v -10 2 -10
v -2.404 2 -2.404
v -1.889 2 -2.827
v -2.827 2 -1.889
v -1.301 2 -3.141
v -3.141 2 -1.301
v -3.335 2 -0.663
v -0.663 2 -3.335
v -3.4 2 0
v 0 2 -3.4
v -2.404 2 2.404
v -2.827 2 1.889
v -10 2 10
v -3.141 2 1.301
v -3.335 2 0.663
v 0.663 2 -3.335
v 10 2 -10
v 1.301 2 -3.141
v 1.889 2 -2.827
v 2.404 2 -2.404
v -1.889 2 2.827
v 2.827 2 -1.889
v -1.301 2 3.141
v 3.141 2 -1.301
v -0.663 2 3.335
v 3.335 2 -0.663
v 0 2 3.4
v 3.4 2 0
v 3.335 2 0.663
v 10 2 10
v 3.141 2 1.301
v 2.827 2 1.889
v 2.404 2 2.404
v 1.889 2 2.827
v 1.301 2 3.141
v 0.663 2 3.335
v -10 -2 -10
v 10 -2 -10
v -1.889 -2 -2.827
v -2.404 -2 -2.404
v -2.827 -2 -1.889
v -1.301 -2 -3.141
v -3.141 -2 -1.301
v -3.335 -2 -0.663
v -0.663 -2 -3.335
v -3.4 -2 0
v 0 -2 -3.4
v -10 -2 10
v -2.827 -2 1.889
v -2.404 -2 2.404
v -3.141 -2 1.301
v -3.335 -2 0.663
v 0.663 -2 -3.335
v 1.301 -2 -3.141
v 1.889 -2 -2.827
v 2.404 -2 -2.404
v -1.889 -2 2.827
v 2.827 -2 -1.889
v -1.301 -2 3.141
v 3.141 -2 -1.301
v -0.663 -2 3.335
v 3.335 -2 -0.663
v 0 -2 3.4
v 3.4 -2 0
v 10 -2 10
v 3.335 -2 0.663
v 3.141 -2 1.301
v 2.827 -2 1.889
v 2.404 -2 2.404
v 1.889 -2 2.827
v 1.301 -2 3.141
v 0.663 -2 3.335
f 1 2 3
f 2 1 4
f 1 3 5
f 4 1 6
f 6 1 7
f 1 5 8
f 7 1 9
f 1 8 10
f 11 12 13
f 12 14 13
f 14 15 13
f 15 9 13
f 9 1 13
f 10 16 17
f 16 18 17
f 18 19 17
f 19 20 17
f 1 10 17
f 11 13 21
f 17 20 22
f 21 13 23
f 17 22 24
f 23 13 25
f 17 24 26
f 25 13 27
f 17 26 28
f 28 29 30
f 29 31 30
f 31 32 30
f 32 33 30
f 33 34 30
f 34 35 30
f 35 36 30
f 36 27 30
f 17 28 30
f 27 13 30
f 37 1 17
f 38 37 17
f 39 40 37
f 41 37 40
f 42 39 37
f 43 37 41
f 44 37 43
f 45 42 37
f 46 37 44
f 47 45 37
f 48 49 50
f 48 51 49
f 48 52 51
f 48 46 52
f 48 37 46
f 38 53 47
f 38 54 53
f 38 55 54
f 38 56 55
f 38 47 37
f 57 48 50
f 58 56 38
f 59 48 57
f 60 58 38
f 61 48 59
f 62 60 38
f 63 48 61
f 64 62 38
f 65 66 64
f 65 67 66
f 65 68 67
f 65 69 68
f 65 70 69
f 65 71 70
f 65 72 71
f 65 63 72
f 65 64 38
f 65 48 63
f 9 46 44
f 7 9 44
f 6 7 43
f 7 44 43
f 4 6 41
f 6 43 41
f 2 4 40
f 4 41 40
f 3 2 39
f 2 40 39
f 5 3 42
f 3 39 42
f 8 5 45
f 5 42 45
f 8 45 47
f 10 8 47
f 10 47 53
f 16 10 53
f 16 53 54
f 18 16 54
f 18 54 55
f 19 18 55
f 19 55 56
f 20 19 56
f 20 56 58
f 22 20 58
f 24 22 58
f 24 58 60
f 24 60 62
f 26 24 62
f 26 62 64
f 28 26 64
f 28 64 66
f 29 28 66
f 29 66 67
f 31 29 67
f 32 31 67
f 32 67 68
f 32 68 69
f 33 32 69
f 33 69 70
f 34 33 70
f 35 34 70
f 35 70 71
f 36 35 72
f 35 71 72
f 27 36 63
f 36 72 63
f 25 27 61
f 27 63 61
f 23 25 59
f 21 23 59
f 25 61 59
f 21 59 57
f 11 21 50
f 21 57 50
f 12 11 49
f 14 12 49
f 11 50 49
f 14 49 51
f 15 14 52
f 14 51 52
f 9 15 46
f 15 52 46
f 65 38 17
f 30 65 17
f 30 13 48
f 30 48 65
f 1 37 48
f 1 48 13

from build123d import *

# Parameters (mm, degrees)
SKETCH1_W              = 20
SKETCH1_H              = 4
BOSS_EXTRUDE1_DEPTH    = 10
M8X1_25_TAPPED_HOLE1_D = 6.8


with BuildPart() as part:
    # Sketch1 → Boss-Extrude1 (new, symmetric)
    with BuildSketch(Plane.XY):
        Rectangle(SKETCH1_W, SKETCH1_H)
    extrude(amount=BOSS_EXTRUDE1_DEPTH, both=True)

    # M8x1.25 Tapped Hole1 (through all)
    with Locations(Plane(origin=(0, 2, 0), x_dir=(1, 0, 0), z_dir=(0, 1, 0))):
        with Locations((0, 0)):
            Hole(M8X1_25_TAPPED_HOLE1_D / 2)


solid = part.part
